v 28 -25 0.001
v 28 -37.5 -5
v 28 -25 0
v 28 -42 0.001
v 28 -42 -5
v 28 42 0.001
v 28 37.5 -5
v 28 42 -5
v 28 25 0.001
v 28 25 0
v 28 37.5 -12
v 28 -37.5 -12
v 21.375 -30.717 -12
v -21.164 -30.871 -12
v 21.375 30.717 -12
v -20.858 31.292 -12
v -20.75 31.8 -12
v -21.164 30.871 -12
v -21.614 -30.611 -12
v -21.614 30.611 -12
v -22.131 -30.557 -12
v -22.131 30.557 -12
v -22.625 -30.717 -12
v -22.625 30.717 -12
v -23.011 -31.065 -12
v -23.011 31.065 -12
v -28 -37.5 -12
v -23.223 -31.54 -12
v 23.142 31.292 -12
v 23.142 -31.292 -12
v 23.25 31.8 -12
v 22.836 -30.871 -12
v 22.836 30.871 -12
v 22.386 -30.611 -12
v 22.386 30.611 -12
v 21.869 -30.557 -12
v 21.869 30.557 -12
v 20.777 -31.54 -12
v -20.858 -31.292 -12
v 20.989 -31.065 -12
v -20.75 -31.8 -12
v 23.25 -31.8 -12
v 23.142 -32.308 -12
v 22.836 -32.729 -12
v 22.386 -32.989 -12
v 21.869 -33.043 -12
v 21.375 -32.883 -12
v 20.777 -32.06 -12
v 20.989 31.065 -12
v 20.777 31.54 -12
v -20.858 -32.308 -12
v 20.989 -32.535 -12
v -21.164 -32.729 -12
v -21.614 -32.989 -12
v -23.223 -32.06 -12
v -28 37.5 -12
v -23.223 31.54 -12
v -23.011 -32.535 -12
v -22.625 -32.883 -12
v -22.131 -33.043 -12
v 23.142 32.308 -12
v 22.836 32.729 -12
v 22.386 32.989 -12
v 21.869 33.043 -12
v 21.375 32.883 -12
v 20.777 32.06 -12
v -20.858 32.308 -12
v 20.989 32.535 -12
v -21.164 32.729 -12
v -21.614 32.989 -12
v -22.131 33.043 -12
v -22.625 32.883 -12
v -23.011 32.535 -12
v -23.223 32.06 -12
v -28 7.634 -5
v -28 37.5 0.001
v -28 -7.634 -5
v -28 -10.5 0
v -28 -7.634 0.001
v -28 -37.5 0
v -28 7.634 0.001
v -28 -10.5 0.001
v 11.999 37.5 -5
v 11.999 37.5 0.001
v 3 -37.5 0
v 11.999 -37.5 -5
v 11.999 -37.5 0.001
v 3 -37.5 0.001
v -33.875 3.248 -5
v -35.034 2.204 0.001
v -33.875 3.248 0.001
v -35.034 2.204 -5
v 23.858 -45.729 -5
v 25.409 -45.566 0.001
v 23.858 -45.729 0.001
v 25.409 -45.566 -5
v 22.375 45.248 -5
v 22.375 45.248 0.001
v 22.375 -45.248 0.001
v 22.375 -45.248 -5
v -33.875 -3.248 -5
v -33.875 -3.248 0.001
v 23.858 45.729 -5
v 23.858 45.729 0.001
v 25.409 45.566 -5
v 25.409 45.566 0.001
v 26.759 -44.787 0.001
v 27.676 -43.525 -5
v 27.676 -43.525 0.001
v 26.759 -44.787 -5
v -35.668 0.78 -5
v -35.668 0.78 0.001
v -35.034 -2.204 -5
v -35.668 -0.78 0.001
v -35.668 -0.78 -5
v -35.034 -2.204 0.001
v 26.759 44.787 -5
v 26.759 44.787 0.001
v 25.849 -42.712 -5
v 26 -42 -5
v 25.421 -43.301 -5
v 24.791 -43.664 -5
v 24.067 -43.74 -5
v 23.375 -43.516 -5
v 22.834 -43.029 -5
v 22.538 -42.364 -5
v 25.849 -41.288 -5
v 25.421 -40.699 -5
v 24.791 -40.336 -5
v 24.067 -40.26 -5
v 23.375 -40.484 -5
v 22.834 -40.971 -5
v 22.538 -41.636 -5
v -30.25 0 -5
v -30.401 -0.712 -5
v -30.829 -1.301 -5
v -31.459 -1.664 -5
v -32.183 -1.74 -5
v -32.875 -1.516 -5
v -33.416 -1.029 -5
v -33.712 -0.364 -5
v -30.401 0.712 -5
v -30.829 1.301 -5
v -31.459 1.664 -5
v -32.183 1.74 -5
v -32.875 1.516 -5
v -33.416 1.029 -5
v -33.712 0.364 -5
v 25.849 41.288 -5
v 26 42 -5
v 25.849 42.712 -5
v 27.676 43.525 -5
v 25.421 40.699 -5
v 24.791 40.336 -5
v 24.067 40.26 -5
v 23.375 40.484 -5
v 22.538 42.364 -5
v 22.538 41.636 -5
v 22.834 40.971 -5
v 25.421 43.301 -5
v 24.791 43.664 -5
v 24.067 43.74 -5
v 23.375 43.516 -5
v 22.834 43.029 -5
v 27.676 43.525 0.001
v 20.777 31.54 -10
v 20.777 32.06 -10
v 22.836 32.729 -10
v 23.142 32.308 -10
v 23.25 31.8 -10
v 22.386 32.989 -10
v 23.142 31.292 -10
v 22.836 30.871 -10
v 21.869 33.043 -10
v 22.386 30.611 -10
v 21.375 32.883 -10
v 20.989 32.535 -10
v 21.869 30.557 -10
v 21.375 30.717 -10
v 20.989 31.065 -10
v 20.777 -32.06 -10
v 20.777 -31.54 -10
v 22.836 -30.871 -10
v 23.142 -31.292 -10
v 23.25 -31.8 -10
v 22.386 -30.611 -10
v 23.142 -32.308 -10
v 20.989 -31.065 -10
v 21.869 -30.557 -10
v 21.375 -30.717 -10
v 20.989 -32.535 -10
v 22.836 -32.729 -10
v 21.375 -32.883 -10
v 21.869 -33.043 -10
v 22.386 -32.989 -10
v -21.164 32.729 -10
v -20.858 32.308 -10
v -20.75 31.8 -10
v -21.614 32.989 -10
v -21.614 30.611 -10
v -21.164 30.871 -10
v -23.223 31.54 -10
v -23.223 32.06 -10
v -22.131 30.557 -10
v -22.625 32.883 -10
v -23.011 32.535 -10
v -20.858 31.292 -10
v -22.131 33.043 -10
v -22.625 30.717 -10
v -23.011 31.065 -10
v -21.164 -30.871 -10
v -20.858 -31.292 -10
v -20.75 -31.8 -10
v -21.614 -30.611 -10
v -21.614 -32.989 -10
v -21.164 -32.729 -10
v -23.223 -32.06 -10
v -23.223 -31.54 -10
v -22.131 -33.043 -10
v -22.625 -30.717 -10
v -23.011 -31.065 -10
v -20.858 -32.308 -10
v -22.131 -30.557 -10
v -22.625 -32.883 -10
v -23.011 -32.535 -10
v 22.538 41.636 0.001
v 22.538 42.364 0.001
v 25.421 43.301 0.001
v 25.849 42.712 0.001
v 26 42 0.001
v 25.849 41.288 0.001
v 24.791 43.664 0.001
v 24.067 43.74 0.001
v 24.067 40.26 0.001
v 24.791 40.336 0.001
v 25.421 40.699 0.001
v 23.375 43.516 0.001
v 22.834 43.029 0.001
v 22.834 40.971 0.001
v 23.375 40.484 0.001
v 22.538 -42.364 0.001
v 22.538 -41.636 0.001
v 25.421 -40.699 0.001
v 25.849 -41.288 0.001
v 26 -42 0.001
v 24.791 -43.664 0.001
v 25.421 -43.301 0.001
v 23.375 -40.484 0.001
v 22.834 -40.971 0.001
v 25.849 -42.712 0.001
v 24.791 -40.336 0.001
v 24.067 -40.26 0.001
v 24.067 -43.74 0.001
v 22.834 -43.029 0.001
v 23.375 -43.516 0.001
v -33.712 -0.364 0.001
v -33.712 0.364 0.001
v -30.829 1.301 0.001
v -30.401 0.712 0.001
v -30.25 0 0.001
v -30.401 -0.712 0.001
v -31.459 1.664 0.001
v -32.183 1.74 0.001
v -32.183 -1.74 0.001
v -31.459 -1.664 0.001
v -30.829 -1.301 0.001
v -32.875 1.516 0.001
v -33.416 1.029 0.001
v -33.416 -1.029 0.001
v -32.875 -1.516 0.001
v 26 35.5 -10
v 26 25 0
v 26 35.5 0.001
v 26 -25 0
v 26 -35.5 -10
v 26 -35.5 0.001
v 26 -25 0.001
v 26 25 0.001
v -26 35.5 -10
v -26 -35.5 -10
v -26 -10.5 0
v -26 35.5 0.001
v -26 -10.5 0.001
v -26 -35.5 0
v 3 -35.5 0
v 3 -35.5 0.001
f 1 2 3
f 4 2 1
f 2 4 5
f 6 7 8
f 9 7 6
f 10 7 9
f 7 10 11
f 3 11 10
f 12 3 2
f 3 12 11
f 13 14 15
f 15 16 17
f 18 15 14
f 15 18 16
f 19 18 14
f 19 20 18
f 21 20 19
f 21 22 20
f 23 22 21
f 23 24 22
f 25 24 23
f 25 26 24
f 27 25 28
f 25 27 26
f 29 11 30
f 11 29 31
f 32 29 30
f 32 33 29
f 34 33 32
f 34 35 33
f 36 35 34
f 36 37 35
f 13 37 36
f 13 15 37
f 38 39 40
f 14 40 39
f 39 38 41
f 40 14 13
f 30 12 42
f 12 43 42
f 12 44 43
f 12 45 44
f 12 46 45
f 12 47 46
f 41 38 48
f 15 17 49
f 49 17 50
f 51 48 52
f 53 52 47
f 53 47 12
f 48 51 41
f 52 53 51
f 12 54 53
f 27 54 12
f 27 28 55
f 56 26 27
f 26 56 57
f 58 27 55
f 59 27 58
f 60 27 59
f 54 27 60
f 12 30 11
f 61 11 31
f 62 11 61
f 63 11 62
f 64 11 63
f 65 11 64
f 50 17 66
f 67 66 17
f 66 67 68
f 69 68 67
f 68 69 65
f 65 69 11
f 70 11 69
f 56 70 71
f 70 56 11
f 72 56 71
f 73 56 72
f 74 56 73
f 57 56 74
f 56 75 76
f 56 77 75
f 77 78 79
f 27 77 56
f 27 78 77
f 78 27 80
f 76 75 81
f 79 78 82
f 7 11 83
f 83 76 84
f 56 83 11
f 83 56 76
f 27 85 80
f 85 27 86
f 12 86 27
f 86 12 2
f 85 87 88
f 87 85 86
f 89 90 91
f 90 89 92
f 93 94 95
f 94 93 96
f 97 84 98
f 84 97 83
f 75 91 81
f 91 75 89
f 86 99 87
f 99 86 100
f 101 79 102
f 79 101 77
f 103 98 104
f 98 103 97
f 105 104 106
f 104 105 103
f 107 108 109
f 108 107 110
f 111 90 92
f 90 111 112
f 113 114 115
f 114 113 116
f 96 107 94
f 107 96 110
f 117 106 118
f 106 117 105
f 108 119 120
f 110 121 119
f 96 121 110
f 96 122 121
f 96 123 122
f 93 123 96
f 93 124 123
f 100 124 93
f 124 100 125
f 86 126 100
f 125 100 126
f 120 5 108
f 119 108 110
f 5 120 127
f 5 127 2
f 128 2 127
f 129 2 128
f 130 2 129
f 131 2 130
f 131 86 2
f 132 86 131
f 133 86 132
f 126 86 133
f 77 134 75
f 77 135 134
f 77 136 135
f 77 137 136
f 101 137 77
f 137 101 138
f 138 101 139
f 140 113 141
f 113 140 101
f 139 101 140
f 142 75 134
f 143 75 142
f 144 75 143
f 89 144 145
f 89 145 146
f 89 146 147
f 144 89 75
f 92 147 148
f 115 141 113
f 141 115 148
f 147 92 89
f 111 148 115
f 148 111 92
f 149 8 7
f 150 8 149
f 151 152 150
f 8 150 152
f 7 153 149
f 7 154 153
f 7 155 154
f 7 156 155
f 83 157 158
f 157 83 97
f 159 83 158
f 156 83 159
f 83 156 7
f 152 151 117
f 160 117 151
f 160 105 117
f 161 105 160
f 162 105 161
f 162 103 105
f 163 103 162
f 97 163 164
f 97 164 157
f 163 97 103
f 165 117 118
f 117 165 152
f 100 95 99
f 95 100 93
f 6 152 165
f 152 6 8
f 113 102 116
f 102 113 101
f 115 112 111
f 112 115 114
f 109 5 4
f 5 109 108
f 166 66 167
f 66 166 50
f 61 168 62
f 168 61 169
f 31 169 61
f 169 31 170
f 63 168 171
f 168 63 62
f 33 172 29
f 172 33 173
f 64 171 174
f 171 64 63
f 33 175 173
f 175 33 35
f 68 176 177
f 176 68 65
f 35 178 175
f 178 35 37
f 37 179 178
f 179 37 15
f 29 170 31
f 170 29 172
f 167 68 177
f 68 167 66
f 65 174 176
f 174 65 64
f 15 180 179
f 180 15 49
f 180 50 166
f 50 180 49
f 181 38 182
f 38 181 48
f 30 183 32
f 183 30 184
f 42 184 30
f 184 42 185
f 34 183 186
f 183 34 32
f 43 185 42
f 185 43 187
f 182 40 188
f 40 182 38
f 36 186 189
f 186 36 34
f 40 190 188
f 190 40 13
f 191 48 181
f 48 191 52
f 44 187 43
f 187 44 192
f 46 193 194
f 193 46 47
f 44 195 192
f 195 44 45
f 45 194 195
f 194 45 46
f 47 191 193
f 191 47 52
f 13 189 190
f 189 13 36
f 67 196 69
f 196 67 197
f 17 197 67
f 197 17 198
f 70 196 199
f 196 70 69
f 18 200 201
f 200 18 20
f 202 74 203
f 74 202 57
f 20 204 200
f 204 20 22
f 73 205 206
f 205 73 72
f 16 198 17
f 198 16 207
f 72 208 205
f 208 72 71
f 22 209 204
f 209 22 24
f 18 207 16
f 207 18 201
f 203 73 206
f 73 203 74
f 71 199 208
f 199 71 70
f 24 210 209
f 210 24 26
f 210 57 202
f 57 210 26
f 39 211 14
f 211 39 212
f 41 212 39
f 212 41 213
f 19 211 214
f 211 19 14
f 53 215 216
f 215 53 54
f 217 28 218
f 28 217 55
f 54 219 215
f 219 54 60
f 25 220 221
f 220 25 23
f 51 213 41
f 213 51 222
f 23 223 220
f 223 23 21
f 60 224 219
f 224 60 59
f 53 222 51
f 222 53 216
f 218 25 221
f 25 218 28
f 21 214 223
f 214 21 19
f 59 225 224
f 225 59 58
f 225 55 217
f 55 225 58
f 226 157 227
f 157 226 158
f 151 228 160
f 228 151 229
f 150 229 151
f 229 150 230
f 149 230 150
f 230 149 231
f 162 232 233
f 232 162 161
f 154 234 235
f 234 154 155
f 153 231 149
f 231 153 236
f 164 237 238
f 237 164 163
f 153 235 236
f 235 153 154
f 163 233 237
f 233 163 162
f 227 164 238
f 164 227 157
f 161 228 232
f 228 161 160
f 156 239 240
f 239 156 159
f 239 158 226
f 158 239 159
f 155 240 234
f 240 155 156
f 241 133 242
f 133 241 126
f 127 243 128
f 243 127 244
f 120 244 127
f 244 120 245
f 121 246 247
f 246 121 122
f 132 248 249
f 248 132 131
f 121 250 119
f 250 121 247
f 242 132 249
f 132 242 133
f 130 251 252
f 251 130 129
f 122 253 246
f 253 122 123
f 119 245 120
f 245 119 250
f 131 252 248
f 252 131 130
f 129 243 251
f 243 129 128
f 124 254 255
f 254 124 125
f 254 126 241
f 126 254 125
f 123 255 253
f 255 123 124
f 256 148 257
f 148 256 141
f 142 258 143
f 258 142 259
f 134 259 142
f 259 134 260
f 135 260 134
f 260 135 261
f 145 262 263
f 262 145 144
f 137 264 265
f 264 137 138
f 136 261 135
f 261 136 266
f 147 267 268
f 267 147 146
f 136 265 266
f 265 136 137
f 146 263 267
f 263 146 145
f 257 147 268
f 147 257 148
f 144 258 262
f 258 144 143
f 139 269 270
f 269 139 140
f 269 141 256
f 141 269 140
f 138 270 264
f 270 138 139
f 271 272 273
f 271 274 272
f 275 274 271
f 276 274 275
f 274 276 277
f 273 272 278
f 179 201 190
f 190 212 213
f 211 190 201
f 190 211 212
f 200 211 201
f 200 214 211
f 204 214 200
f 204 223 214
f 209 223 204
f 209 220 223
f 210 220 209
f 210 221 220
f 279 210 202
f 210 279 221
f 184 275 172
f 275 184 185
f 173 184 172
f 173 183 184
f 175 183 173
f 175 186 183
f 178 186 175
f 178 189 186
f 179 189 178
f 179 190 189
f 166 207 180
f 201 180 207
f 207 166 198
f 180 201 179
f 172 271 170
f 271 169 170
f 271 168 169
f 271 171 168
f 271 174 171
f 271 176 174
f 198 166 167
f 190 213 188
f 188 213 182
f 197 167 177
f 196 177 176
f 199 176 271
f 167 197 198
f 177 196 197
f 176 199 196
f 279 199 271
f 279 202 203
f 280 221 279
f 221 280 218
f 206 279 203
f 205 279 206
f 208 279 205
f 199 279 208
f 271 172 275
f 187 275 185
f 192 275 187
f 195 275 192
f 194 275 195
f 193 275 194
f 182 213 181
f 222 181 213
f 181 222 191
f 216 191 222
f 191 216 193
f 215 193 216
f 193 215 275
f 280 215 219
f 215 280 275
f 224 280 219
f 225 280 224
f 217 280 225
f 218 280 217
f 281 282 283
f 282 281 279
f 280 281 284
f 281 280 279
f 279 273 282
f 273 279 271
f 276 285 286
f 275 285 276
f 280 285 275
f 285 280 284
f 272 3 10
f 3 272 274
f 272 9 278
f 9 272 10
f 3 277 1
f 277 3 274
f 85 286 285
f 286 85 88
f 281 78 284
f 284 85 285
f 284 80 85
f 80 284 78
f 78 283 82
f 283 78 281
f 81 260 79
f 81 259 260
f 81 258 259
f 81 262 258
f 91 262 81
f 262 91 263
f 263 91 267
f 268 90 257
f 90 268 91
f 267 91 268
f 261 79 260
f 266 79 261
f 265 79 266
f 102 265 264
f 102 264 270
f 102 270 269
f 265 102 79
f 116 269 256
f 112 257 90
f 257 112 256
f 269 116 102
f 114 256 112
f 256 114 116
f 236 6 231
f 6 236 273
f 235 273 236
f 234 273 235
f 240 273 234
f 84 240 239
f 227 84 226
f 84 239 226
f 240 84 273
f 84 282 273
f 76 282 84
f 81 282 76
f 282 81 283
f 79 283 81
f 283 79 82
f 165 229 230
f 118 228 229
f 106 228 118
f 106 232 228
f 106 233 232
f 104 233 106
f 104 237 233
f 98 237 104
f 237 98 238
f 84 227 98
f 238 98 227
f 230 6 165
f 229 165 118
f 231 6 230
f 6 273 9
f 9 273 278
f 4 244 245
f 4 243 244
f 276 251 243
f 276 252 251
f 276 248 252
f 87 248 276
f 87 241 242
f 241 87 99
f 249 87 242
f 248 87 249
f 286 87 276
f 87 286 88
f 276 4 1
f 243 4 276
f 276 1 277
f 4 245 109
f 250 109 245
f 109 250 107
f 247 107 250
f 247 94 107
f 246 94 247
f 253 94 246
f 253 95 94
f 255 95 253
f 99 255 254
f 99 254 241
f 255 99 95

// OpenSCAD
width = 52;
length = 71;
height = 30;
zbreak = 10;

holes = [
    [22,31.8],
    [22,-31.8],
    [-22,31.8],
    [-22,-31.8]];
hd = 2.5;
th = 2;
joins = [[24.25,42],[24.25,-42],[-32,0]];
jd = 3.5;
jl = 10;
$fn=15;
rotate([0,0,0])difference(){
difference(){
translate([0,0,height/2-zbreak])difference(){
    union(){
        cube([width+2*th,length+2*th,height+2*th],center=true);
        translate([0,0,zbreak-height/2])hull()for(h=joins){
            translate([h[0],h[1],0])
            cylinder(jl,d=jd+2*th,center=true);
        }
    }
    cube([width,length,height],center=true);
    for(h=holes){
        translate([h[0],h[1],-height/2])
        cylinder(th*3,d=hd,center=true);
    }
    for(h=joins){
        translate([h[0],h[1],0])
        cylinder(height,d=jd,center=true);
    }
}
translate([width/2,0,20])cube([14,50,40],center=true);
translate([-width/2,-length/2,20])cube([58,50,40],center=true);
}
translate([0,0,100.001])cube([200,200,200],center=true);
}
